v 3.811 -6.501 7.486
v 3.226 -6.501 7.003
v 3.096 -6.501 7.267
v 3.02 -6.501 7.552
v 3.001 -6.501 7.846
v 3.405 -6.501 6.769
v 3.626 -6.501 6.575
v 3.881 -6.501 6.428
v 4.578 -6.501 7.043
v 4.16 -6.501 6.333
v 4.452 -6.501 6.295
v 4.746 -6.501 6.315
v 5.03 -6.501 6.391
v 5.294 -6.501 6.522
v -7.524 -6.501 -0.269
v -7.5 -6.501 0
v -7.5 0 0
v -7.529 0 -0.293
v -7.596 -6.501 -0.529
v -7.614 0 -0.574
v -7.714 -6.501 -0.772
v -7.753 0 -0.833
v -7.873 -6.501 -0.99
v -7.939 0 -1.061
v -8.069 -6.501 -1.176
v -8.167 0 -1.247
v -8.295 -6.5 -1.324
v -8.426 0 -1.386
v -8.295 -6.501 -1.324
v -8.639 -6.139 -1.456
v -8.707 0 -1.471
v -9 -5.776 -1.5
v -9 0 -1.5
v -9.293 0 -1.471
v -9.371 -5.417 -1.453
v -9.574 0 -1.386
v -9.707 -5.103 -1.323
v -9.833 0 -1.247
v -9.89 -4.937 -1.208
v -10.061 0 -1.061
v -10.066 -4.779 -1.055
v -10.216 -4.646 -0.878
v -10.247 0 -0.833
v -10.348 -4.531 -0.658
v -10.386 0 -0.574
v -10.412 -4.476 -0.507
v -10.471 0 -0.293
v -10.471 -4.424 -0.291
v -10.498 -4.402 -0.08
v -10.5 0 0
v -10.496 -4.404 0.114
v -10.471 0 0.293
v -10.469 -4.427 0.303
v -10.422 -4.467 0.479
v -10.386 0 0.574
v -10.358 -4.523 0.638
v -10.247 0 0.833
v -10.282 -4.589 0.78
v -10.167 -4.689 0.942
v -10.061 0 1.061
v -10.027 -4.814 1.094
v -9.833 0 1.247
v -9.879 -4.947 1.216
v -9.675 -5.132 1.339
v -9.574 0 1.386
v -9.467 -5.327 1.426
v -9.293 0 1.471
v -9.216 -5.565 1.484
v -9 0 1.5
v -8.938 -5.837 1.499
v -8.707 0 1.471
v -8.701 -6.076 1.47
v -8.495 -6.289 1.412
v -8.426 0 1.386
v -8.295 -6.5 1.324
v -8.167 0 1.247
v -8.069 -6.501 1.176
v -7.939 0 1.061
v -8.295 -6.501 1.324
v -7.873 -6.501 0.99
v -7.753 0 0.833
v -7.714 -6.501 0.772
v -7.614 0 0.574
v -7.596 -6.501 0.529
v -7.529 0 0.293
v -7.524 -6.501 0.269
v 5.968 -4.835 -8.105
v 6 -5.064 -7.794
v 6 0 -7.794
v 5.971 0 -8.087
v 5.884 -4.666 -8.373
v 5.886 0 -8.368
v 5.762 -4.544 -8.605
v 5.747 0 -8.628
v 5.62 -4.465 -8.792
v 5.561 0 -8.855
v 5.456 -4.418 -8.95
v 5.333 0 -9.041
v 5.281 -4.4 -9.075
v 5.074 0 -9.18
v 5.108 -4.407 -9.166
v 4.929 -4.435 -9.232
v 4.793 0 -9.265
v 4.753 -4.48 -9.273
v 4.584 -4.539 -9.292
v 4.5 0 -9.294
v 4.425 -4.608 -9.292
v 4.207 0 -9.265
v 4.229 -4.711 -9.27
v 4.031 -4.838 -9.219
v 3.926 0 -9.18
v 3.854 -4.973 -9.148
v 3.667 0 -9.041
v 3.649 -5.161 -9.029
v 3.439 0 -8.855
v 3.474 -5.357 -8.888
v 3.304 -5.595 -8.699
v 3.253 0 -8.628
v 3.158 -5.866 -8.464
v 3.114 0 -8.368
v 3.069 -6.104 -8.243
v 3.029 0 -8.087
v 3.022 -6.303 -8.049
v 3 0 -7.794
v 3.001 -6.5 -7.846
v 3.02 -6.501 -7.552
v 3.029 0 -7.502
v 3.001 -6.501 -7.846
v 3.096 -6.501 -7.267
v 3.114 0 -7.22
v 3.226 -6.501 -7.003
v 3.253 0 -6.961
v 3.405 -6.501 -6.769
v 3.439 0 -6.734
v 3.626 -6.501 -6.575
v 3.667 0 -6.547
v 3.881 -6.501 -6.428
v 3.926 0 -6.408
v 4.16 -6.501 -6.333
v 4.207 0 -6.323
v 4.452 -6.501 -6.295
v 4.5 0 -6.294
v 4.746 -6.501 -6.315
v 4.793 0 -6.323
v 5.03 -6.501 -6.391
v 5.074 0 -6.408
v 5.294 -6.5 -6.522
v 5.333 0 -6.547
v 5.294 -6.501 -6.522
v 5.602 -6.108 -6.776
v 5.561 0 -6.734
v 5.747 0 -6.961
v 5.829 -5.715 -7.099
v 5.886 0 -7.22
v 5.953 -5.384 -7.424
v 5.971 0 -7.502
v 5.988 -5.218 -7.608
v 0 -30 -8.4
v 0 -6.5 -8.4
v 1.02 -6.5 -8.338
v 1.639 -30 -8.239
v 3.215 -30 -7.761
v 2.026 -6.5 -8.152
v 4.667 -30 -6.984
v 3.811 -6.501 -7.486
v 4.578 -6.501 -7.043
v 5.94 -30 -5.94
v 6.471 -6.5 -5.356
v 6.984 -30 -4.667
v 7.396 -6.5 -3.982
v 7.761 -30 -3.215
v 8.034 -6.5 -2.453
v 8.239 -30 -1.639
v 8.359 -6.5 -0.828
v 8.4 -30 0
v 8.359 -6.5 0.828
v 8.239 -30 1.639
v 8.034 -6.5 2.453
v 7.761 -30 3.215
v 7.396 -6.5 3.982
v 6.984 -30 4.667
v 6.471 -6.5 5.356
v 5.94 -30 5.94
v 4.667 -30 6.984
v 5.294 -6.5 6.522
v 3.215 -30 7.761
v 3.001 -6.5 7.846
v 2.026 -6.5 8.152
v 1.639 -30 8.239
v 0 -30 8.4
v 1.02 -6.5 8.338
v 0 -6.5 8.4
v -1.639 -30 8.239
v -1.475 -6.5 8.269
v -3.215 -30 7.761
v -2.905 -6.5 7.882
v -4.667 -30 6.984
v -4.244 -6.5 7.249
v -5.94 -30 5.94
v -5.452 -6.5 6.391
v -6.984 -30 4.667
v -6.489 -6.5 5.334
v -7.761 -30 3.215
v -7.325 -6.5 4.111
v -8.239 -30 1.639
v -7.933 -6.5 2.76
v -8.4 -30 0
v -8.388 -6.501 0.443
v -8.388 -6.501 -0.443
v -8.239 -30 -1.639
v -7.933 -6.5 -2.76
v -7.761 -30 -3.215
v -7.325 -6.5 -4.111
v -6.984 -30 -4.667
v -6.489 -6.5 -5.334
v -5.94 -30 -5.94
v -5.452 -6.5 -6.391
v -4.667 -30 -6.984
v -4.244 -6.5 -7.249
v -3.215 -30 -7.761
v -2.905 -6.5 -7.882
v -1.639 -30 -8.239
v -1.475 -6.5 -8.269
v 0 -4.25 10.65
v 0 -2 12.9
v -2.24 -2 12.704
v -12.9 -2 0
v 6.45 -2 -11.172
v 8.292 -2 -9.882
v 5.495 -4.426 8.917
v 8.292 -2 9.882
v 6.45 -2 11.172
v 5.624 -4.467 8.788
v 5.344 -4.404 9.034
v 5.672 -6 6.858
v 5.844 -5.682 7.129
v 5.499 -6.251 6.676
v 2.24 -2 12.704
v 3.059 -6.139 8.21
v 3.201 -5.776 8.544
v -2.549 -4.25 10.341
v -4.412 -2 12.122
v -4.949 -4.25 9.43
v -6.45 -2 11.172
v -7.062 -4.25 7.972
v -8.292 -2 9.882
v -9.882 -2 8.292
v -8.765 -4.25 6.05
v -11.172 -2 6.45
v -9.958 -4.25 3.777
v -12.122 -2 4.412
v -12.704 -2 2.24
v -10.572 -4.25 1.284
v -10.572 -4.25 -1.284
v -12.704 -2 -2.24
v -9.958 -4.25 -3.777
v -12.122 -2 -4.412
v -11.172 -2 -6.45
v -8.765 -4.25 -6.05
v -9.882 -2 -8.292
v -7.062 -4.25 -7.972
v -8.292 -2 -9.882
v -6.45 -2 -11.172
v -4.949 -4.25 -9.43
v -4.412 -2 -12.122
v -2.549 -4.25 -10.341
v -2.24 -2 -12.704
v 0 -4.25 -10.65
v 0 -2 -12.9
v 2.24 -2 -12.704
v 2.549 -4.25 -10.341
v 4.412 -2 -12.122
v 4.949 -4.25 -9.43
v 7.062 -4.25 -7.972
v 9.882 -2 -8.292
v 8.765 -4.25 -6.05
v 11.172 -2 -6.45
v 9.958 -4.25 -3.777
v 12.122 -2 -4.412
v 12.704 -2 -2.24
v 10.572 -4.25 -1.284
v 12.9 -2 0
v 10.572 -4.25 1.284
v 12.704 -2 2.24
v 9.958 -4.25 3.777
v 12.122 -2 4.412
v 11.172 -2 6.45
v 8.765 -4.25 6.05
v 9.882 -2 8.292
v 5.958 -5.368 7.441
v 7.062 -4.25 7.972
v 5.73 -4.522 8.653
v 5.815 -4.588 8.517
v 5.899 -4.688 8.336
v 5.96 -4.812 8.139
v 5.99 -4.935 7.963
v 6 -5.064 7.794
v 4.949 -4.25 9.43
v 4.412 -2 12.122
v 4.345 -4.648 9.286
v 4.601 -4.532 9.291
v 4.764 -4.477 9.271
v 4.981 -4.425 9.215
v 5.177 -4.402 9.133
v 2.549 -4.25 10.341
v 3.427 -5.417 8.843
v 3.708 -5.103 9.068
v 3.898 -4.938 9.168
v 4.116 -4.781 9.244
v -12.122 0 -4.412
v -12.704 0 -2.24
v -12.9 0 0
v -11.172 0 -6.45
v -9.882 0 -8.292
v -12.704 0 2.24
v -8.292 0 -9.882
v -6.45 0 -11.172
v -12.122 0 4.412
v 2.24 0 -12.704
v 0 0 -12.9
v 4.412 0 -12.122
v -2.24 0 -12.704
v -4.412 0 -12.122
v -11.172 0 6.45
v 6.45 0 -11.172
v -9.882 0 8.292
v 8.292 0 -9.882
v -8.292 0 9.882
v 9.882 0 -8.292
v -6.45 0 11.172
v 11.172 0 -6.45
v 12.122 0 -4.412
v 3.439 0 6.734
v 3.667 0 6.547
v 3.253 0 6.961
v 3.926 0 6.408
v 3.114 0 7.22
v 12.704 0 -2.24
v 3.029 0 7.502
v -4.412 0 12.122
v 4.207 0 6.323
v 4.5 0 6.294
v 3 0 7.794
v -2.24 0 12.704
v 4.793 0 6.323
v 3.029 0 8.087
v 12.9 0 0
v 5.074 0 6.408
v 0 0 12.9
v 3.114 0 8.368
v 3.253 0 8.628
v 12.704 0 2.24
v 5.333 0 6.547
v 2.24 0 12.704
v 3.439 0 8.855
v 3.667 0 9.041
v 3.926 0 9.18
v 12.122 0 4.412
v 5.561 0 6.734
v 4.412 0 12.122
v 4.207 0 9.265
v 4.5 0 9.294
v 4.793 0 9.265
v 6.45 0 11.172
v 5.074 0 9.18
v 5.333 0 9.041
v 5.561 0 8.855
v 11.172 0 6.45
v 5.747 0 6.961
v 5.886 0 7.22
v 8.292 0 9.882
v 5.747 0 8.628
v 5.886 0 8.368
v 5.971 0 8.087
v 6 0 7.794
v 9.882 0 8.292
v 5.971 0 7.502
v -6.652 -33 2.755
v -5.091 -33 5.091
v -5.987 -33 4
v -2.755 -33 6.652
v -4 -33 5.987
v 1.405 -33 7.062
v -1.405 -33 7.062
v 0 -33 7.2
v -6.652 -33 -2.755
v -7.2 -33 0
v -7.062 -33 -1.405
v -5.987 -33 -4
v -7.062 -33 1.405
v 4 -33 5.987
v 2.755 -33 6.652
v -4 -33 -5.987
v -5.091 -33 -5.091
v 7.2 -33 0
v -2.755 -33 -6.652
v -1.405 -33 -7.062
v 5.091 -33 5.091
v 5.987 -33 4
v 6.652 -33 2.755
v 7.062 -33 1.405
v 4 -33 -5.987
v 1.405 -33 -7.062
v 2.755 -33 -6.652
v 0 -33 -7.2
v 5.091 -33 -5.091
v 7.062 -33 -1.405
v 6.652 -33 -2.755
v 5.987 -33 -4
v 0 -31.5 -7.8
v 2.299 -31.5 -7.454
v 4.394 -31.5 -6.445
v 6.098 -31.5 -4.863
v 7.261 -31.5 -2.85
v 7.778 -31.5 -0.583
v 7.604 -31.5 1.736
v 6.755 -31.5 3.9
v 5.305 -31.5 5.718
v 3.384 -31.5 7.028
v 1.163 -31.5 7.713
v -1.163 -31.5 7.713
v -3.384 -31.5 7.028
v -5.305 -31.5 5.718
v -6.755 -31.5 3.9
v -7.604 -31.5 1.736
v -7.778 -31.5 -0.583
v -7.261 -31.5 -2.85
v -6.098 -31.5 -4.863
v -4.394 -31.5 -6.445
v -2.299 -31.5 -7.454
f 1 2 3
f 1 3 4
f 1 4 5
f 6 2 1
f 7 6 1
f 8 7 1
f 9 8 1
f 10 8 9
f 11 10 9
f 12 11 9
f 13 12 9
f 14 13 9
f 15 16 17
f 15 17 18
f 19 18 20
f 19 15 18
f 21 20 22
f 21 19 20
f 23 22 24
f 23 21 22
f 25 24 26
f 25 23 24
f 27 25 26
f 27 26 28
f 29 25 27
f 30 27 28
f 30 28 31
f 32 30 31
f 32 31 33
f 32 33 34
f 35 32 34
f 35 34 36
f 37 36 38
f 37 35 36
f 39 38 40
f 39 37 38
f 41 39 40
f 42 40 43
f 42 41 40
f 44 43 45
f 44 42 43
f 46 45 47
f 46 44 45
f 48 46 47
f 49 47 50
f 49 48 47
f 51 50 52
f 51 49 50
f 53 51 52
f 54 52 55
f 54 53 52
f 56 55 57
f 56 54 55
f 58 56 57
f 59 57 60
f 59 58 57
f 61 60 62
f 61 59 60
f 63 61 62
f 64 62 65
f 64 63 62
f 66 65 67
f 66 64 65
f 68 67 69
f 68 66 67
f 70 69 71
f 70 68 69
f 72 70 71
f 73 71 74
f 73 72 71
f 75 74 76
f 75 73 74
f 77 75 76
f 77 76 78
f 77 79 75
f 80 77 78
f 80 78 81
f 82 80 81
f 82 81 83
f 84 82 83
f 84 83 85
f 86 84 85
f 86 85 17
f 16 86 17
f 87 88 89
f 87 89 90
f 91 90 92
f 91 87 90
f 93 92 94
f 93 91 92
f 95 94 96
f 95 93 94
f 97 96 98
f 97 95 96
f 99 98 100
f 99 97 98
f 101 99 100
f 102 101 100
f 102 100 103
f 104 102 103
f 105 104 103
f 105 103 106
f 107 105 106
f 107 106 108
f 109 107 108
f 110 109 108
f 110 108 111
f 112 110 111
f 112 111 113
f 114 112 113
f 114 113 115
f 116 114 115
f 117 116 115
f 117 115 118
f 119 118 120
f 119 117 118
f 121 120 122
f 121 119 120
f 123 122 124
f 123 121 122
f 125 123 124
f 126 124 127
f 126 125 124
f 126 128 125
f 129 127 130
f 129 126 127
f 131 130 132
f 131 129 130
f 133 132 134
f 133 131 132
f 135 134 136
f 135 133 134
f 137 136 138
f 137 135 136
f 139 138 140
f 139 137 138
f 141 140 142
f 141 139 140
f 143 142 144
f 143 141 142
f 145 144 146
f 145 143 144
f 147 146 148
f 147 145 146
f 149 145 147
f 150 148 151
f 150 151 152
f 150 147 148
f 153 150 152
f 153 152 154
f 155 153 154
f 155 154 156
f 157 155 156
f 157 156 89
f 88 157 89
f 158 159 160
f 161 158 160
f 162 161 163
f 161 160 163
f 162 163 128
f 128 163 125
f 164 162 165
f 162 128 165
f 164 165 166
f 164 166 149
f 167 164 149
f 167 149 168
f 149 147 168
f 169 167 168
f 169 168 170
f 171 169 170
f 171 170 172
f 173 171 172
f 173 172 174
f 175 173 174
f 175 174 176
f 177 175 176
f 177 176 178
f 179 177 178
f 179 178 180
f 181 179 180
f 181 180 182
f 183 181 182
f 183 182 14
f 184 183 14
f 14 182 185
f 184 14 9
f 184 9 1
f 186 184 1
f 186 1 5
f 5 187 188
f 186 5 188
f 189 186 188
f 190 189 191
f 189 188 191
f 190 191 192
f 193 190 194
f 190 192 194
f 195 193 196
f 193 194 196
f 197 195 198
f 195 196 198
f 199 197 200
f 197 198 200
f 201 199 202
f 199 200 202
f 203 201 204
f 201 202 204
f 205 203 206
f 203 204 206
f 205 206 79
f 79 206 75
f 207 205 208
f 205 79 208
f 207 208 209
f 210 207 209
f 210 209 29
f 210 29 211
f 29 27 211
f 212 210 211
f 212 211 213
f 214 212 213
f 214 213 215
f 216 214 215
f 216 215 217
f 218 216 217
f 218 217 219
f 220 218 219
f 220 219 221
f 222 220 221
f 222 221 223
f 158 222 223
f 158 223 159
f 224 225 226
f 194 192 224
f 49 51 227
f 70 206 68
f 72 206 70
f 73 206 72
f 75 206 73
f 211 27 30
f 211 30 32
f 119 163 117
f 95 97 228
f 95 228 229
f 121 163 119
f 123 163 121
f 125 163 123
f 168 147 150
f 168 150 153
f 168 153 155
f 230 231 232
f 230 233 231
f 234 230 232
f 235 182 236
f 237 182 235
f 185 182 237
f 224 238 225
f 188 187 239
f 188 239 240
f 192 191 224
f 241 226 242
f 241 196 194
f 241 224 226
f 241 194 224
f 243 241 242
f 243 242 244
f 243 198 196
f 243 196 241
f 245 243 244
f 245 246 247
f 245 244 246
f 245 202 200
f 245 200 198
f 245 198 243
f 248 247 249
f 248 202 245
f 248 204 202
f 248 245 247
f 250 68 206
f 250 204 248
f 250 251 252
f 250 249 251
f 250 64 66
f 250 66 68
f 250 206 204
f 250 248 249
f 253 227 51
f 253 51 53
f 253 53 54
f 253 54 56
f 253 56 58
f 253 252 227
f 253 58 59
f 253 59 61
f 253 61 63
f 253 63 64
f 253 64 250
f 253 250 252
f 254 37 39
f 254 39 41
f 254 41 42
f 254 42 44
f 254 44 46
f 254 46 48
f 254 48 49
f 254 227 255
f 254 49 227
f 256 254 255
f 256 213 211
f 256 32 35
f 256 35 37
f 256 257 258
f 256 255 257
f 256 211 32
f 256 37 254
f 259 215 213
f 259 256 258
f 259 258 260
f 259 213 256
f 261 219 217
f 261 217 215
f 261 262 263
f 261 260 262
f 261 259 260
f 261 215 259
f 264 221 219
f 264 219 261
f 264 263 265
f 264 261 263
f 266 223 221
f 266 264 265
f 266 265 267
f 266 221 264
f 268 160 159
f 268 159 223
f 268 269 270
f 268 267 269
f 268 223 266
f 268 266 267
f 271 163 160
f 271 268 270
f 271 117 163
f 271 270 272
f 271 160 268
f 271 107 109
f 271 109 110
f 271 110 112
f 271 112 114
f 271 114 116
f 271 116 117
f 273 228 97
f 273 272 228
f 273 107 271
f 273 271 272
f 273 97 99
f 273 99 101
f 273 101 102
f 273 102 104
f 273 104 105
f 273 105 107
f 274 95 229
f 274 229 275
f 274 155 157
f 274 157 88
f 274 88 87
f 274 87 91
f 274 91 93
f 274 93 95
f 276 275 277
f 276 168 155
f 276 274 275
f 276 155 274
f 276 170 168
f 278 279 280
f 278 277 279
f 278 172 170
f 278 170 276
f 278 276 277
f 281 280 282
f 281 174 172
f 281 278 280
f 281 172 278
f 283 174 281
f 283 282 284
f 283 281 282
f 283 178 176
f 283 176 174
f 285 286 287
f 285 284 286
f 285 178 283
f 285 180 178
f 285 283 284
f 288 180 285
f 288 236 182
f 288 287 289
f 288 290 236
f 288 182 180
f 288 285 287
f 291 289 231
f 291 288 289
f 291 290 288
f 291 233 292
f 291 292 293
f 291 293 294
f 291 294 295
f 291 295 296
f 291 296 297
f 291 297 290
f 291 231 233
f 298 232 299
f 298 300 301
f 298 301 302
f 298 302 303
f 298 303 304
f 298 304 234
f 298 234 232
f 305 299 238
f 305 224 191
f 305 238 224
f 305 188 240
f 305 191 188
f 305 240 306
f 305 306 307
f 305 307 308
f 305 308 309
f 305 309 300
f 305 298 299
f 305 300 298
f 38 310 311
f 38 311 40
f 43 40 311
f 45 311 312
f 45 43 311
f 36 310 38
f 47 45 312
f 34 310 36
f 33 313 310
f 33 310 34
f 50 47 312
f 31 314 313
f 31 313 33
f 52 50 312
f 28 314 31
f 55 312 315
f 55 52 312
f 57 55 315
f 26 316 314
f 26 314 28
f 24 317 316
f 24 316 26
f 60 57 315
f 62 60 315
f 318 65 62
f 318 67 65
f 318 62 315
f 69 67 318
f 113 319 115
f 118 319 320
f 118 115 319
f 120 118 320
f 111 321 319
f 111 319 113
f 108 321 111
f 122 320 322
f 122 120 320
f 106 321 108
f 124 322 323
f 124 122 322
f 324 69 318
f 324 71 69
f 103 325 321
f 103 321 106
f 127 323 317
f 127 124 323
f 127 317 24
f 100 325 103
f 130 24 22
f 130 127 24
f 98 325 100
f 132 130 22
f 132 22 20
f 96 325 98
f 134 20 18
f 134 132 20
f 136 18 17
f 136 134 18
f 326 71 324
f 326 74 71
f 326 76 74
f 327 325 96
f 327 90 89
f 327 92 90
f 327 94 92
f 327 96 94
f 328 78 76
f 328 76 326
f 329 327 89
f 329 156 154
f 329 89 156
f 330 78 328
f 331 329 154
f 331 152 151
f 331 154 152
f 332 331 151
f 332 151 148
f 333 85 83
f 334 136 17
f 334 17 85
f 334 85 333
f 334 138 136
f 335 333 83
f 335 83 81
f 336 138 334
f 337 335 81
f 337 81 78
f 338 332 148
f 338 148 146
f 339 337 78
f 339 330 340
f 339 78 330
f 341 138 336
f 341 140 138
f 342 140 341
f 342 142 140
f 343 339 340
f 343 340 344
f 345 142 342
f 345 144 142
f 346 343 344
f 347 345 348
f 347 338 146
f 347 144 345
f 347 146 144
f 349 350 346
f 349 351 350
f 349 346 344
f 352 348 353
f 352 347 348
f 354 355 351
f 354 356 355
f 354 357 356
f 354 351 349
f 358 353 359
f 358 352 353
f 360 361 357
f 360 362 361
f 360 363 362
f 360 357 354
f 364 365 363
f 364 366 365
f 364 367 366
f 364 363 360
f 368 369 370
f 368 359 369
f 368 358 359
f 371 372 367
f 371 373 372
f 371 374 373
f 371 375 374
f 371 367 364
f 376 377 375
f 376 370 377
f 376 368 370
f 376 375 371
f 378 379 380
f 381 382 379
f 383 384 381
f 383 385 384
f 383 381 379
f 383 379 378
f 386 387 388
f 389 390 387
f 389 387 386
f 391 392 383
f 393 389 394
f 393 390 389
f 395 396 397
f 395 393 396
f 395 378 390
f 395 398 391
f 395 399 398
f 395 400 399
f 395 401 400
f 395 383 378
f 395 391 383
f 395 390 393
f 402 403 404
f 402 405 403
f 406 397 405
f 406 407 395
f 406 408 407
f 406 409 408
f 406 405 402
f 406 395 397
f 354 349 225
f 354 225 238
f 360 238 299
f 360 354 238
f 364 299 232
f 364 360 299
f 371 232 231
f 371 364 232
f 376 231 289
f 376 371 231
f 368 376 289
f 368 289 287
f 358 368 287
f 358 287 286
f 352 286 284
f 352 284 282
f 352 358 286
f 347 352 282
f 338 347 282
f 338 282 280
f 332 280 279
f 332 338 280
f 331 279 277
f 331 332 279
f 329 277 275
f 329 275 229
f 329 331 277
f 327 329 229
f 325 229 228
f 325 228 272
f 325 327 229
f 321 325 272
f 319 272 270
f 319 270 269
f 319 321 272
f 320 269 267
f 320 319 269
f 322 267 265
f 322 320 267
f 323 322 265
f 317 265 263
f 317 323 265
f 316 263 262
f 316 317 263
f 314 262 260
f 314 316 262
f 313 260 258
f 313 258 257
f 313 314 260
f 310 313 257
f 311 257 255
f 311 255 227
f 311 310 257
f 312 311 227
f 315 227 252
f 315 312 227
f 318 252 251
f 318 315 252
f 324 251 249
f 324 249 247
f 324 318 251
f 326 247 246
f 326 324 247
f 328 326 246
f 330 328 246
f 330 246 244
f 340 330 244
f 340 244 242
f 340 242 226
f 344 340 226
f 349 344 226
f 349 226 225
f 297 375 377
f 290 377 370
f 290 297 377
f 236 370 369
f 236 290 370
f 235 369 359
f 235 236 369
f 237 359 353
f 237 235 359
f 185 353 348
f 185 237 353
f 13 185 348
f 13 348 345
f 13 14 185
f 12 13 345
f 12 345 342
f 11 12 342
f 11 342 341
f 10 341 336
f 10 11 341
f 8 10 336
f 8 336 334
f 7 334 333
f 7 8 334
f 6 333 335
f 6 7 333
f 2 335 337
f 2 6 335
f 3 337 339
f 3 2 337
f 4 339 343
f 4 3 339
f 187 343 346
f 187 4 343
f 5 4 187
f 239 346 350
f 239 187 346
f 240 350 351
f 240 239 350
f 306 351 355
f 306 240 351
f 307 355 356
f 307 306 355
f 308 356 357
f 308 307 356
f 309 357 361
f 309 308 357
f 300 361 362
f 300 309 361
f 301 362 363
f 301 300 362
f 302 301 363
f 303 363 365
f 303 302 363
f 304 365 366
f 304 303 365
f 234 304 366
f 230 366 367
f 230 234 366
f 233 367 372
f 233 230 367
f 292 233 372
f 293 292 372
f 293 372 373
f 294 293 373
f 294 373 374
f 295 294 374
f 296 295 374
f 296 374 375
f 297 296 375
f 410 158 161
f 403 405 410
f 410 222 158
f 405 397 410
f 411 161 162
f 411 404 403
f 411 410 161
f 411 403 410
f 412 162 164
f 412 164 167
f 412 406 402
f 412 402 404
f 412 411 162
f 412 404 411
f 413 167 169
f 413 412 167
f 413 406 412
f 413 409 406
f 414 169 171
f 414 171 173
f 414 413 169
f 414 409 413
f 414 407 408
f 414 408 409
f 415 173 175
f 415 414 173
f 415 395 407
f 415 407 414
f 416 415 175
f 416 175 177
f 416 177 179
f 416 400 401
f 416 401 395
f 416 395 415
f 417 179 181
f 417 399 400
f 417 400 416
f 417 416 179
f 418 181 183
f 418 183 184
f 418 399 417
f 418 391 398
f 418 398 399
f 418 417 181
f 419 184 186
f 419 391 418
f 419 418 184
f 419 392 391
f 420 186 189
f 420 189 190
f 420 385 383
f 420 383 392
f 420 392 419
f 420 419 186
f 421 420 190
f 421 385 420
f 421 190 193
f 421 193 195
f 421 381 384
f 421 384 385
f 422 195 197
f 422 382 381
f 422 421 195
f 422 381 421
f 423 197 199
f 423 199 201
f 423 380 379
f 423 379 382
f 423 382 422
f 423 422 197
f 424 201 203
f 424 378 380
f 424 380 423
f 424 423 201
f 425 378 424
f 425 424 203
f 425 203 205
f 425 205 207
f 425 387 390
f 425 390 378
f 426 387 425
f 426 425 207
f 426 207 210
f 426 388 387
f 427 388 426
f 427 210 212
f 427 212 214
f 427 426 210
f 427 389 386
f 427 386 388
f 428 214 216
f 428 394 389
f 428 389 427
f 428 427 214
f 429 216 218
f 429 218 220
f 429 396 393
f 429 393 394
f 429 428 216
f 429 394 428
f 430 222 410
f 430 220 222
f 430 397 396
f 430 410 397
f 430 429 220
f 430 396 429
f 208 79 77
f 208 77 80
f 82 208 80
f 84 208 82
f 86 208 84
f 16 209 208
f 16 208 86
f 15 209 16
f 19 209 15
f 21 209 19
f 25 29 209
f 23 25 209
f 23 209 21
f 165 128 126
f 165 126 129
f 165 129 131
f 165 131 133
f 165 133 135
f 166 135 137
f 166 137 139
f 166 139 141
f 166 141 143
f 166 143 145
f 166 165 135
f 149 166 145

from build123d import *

# Parameters (mm, degrees)
SKETCH1_R                     = 12.9
BOSS_EXTRUDE1_DEPTH           = 2
SKETCH2_R                     = 12.9
BOSS_EXTRUDE2_DEPTH           = 4.5
BOSS_EXTRUDE2_TAPER           = 45
SKETCH3_R                     = 8.4
BOSS_EXTRUDE3_DEPTH           = 23.5
SKETCH5_R                     = 8.4
BOSS_EXTRUDE4_DEPTH           = 3
BOSS_EXTRUDE4_TAPER           = 21.8
F_6_0MM_START                 = -6.501
F_6_0MM_DOWEL_HOLE1_OUTLINE_R = 1.5
F_6_0MM_DOWEL_HOLE1_DEPTH     = 6.501


# Read off the part's stored shape, not the designer's step: Ø6.0mm Dowel Hole1
with BuildPart() as part:
    # Sketch1 → Boss-Extrude1 (new body)
    with BuildSketch(Plane(origin=(0, 0, 0), x_dir=(1, 0, 0), z_dir=(0, 1, 0))):
        with Locations(Location((0, 0, 0), (0, 0, 270))):
            Circle(SKETCH1_R)
    extrude(amount=-BOSS_EXTRUDE1_DEPTH)

    # Sketch2 → Boss-Extrude2 (add)
    with BuildSketch(Plane.XZ.offset(2)):
        with Locations(Location((0, 0, 0), (0, 0, 90))):
            Circle(SKETCH2_R)
    extrude(amount=BOSS_EXTRUDE2_DEPTH, taper=BOSS_EXTRUDE2_TAPER)

    # Sketch3 → Boss-Extrude3 (add)
    with BuildSketch(Plane.XZ.offset(6.5)):
        with Locations(Location((0, 0, 0), (0, 0, 270))):
            Circle(SKETCH3_R)
    extrude(amount=BOSS_EXTRUDE3_DEPTH)

    # Sketch5 → Boss-Extrude4 (add)
    with BuildSketch(Plane.XZ.offset(30)):
        with Locations(Location((0, 0, 0), (0, 0, 270))):
            Circle(SKETCH5_R)
    extrude(amount=BOSS_EXTRUDE4_DEPTH, taper=BOSS_EXTRUDE4_TAPER)

    # Ø6.0mm Dowel Hole1 outline → Ø6.0mm Dowel Hole1 (cut)
    with BuildSketch(Plane(origin=(0, 0, 0), x_dir=(1, 0, 0), z_dir=(0, 1, 0)).offset(F_6_0MM_START)):
        with Locations((4.5, -7.794228634)):
            Circle(F_6_0MM_DOWEL_HOLE1_OUTLINE_R)
        with Locations((4.5, 7.794228634)):
            Circle(F_6_0MM_DOWEL_HOLE1_OUTLINE_R)
        with Locations((-9, 0)):
            Circle(F_6_0MM_DOWEL_HOLE1_OUTLINE_R)
    extrude(amount=F_6_0MM_DOWEL_HOLE1_DEPTH, mode=Mode.SUBTRACT)


solid = part.part
